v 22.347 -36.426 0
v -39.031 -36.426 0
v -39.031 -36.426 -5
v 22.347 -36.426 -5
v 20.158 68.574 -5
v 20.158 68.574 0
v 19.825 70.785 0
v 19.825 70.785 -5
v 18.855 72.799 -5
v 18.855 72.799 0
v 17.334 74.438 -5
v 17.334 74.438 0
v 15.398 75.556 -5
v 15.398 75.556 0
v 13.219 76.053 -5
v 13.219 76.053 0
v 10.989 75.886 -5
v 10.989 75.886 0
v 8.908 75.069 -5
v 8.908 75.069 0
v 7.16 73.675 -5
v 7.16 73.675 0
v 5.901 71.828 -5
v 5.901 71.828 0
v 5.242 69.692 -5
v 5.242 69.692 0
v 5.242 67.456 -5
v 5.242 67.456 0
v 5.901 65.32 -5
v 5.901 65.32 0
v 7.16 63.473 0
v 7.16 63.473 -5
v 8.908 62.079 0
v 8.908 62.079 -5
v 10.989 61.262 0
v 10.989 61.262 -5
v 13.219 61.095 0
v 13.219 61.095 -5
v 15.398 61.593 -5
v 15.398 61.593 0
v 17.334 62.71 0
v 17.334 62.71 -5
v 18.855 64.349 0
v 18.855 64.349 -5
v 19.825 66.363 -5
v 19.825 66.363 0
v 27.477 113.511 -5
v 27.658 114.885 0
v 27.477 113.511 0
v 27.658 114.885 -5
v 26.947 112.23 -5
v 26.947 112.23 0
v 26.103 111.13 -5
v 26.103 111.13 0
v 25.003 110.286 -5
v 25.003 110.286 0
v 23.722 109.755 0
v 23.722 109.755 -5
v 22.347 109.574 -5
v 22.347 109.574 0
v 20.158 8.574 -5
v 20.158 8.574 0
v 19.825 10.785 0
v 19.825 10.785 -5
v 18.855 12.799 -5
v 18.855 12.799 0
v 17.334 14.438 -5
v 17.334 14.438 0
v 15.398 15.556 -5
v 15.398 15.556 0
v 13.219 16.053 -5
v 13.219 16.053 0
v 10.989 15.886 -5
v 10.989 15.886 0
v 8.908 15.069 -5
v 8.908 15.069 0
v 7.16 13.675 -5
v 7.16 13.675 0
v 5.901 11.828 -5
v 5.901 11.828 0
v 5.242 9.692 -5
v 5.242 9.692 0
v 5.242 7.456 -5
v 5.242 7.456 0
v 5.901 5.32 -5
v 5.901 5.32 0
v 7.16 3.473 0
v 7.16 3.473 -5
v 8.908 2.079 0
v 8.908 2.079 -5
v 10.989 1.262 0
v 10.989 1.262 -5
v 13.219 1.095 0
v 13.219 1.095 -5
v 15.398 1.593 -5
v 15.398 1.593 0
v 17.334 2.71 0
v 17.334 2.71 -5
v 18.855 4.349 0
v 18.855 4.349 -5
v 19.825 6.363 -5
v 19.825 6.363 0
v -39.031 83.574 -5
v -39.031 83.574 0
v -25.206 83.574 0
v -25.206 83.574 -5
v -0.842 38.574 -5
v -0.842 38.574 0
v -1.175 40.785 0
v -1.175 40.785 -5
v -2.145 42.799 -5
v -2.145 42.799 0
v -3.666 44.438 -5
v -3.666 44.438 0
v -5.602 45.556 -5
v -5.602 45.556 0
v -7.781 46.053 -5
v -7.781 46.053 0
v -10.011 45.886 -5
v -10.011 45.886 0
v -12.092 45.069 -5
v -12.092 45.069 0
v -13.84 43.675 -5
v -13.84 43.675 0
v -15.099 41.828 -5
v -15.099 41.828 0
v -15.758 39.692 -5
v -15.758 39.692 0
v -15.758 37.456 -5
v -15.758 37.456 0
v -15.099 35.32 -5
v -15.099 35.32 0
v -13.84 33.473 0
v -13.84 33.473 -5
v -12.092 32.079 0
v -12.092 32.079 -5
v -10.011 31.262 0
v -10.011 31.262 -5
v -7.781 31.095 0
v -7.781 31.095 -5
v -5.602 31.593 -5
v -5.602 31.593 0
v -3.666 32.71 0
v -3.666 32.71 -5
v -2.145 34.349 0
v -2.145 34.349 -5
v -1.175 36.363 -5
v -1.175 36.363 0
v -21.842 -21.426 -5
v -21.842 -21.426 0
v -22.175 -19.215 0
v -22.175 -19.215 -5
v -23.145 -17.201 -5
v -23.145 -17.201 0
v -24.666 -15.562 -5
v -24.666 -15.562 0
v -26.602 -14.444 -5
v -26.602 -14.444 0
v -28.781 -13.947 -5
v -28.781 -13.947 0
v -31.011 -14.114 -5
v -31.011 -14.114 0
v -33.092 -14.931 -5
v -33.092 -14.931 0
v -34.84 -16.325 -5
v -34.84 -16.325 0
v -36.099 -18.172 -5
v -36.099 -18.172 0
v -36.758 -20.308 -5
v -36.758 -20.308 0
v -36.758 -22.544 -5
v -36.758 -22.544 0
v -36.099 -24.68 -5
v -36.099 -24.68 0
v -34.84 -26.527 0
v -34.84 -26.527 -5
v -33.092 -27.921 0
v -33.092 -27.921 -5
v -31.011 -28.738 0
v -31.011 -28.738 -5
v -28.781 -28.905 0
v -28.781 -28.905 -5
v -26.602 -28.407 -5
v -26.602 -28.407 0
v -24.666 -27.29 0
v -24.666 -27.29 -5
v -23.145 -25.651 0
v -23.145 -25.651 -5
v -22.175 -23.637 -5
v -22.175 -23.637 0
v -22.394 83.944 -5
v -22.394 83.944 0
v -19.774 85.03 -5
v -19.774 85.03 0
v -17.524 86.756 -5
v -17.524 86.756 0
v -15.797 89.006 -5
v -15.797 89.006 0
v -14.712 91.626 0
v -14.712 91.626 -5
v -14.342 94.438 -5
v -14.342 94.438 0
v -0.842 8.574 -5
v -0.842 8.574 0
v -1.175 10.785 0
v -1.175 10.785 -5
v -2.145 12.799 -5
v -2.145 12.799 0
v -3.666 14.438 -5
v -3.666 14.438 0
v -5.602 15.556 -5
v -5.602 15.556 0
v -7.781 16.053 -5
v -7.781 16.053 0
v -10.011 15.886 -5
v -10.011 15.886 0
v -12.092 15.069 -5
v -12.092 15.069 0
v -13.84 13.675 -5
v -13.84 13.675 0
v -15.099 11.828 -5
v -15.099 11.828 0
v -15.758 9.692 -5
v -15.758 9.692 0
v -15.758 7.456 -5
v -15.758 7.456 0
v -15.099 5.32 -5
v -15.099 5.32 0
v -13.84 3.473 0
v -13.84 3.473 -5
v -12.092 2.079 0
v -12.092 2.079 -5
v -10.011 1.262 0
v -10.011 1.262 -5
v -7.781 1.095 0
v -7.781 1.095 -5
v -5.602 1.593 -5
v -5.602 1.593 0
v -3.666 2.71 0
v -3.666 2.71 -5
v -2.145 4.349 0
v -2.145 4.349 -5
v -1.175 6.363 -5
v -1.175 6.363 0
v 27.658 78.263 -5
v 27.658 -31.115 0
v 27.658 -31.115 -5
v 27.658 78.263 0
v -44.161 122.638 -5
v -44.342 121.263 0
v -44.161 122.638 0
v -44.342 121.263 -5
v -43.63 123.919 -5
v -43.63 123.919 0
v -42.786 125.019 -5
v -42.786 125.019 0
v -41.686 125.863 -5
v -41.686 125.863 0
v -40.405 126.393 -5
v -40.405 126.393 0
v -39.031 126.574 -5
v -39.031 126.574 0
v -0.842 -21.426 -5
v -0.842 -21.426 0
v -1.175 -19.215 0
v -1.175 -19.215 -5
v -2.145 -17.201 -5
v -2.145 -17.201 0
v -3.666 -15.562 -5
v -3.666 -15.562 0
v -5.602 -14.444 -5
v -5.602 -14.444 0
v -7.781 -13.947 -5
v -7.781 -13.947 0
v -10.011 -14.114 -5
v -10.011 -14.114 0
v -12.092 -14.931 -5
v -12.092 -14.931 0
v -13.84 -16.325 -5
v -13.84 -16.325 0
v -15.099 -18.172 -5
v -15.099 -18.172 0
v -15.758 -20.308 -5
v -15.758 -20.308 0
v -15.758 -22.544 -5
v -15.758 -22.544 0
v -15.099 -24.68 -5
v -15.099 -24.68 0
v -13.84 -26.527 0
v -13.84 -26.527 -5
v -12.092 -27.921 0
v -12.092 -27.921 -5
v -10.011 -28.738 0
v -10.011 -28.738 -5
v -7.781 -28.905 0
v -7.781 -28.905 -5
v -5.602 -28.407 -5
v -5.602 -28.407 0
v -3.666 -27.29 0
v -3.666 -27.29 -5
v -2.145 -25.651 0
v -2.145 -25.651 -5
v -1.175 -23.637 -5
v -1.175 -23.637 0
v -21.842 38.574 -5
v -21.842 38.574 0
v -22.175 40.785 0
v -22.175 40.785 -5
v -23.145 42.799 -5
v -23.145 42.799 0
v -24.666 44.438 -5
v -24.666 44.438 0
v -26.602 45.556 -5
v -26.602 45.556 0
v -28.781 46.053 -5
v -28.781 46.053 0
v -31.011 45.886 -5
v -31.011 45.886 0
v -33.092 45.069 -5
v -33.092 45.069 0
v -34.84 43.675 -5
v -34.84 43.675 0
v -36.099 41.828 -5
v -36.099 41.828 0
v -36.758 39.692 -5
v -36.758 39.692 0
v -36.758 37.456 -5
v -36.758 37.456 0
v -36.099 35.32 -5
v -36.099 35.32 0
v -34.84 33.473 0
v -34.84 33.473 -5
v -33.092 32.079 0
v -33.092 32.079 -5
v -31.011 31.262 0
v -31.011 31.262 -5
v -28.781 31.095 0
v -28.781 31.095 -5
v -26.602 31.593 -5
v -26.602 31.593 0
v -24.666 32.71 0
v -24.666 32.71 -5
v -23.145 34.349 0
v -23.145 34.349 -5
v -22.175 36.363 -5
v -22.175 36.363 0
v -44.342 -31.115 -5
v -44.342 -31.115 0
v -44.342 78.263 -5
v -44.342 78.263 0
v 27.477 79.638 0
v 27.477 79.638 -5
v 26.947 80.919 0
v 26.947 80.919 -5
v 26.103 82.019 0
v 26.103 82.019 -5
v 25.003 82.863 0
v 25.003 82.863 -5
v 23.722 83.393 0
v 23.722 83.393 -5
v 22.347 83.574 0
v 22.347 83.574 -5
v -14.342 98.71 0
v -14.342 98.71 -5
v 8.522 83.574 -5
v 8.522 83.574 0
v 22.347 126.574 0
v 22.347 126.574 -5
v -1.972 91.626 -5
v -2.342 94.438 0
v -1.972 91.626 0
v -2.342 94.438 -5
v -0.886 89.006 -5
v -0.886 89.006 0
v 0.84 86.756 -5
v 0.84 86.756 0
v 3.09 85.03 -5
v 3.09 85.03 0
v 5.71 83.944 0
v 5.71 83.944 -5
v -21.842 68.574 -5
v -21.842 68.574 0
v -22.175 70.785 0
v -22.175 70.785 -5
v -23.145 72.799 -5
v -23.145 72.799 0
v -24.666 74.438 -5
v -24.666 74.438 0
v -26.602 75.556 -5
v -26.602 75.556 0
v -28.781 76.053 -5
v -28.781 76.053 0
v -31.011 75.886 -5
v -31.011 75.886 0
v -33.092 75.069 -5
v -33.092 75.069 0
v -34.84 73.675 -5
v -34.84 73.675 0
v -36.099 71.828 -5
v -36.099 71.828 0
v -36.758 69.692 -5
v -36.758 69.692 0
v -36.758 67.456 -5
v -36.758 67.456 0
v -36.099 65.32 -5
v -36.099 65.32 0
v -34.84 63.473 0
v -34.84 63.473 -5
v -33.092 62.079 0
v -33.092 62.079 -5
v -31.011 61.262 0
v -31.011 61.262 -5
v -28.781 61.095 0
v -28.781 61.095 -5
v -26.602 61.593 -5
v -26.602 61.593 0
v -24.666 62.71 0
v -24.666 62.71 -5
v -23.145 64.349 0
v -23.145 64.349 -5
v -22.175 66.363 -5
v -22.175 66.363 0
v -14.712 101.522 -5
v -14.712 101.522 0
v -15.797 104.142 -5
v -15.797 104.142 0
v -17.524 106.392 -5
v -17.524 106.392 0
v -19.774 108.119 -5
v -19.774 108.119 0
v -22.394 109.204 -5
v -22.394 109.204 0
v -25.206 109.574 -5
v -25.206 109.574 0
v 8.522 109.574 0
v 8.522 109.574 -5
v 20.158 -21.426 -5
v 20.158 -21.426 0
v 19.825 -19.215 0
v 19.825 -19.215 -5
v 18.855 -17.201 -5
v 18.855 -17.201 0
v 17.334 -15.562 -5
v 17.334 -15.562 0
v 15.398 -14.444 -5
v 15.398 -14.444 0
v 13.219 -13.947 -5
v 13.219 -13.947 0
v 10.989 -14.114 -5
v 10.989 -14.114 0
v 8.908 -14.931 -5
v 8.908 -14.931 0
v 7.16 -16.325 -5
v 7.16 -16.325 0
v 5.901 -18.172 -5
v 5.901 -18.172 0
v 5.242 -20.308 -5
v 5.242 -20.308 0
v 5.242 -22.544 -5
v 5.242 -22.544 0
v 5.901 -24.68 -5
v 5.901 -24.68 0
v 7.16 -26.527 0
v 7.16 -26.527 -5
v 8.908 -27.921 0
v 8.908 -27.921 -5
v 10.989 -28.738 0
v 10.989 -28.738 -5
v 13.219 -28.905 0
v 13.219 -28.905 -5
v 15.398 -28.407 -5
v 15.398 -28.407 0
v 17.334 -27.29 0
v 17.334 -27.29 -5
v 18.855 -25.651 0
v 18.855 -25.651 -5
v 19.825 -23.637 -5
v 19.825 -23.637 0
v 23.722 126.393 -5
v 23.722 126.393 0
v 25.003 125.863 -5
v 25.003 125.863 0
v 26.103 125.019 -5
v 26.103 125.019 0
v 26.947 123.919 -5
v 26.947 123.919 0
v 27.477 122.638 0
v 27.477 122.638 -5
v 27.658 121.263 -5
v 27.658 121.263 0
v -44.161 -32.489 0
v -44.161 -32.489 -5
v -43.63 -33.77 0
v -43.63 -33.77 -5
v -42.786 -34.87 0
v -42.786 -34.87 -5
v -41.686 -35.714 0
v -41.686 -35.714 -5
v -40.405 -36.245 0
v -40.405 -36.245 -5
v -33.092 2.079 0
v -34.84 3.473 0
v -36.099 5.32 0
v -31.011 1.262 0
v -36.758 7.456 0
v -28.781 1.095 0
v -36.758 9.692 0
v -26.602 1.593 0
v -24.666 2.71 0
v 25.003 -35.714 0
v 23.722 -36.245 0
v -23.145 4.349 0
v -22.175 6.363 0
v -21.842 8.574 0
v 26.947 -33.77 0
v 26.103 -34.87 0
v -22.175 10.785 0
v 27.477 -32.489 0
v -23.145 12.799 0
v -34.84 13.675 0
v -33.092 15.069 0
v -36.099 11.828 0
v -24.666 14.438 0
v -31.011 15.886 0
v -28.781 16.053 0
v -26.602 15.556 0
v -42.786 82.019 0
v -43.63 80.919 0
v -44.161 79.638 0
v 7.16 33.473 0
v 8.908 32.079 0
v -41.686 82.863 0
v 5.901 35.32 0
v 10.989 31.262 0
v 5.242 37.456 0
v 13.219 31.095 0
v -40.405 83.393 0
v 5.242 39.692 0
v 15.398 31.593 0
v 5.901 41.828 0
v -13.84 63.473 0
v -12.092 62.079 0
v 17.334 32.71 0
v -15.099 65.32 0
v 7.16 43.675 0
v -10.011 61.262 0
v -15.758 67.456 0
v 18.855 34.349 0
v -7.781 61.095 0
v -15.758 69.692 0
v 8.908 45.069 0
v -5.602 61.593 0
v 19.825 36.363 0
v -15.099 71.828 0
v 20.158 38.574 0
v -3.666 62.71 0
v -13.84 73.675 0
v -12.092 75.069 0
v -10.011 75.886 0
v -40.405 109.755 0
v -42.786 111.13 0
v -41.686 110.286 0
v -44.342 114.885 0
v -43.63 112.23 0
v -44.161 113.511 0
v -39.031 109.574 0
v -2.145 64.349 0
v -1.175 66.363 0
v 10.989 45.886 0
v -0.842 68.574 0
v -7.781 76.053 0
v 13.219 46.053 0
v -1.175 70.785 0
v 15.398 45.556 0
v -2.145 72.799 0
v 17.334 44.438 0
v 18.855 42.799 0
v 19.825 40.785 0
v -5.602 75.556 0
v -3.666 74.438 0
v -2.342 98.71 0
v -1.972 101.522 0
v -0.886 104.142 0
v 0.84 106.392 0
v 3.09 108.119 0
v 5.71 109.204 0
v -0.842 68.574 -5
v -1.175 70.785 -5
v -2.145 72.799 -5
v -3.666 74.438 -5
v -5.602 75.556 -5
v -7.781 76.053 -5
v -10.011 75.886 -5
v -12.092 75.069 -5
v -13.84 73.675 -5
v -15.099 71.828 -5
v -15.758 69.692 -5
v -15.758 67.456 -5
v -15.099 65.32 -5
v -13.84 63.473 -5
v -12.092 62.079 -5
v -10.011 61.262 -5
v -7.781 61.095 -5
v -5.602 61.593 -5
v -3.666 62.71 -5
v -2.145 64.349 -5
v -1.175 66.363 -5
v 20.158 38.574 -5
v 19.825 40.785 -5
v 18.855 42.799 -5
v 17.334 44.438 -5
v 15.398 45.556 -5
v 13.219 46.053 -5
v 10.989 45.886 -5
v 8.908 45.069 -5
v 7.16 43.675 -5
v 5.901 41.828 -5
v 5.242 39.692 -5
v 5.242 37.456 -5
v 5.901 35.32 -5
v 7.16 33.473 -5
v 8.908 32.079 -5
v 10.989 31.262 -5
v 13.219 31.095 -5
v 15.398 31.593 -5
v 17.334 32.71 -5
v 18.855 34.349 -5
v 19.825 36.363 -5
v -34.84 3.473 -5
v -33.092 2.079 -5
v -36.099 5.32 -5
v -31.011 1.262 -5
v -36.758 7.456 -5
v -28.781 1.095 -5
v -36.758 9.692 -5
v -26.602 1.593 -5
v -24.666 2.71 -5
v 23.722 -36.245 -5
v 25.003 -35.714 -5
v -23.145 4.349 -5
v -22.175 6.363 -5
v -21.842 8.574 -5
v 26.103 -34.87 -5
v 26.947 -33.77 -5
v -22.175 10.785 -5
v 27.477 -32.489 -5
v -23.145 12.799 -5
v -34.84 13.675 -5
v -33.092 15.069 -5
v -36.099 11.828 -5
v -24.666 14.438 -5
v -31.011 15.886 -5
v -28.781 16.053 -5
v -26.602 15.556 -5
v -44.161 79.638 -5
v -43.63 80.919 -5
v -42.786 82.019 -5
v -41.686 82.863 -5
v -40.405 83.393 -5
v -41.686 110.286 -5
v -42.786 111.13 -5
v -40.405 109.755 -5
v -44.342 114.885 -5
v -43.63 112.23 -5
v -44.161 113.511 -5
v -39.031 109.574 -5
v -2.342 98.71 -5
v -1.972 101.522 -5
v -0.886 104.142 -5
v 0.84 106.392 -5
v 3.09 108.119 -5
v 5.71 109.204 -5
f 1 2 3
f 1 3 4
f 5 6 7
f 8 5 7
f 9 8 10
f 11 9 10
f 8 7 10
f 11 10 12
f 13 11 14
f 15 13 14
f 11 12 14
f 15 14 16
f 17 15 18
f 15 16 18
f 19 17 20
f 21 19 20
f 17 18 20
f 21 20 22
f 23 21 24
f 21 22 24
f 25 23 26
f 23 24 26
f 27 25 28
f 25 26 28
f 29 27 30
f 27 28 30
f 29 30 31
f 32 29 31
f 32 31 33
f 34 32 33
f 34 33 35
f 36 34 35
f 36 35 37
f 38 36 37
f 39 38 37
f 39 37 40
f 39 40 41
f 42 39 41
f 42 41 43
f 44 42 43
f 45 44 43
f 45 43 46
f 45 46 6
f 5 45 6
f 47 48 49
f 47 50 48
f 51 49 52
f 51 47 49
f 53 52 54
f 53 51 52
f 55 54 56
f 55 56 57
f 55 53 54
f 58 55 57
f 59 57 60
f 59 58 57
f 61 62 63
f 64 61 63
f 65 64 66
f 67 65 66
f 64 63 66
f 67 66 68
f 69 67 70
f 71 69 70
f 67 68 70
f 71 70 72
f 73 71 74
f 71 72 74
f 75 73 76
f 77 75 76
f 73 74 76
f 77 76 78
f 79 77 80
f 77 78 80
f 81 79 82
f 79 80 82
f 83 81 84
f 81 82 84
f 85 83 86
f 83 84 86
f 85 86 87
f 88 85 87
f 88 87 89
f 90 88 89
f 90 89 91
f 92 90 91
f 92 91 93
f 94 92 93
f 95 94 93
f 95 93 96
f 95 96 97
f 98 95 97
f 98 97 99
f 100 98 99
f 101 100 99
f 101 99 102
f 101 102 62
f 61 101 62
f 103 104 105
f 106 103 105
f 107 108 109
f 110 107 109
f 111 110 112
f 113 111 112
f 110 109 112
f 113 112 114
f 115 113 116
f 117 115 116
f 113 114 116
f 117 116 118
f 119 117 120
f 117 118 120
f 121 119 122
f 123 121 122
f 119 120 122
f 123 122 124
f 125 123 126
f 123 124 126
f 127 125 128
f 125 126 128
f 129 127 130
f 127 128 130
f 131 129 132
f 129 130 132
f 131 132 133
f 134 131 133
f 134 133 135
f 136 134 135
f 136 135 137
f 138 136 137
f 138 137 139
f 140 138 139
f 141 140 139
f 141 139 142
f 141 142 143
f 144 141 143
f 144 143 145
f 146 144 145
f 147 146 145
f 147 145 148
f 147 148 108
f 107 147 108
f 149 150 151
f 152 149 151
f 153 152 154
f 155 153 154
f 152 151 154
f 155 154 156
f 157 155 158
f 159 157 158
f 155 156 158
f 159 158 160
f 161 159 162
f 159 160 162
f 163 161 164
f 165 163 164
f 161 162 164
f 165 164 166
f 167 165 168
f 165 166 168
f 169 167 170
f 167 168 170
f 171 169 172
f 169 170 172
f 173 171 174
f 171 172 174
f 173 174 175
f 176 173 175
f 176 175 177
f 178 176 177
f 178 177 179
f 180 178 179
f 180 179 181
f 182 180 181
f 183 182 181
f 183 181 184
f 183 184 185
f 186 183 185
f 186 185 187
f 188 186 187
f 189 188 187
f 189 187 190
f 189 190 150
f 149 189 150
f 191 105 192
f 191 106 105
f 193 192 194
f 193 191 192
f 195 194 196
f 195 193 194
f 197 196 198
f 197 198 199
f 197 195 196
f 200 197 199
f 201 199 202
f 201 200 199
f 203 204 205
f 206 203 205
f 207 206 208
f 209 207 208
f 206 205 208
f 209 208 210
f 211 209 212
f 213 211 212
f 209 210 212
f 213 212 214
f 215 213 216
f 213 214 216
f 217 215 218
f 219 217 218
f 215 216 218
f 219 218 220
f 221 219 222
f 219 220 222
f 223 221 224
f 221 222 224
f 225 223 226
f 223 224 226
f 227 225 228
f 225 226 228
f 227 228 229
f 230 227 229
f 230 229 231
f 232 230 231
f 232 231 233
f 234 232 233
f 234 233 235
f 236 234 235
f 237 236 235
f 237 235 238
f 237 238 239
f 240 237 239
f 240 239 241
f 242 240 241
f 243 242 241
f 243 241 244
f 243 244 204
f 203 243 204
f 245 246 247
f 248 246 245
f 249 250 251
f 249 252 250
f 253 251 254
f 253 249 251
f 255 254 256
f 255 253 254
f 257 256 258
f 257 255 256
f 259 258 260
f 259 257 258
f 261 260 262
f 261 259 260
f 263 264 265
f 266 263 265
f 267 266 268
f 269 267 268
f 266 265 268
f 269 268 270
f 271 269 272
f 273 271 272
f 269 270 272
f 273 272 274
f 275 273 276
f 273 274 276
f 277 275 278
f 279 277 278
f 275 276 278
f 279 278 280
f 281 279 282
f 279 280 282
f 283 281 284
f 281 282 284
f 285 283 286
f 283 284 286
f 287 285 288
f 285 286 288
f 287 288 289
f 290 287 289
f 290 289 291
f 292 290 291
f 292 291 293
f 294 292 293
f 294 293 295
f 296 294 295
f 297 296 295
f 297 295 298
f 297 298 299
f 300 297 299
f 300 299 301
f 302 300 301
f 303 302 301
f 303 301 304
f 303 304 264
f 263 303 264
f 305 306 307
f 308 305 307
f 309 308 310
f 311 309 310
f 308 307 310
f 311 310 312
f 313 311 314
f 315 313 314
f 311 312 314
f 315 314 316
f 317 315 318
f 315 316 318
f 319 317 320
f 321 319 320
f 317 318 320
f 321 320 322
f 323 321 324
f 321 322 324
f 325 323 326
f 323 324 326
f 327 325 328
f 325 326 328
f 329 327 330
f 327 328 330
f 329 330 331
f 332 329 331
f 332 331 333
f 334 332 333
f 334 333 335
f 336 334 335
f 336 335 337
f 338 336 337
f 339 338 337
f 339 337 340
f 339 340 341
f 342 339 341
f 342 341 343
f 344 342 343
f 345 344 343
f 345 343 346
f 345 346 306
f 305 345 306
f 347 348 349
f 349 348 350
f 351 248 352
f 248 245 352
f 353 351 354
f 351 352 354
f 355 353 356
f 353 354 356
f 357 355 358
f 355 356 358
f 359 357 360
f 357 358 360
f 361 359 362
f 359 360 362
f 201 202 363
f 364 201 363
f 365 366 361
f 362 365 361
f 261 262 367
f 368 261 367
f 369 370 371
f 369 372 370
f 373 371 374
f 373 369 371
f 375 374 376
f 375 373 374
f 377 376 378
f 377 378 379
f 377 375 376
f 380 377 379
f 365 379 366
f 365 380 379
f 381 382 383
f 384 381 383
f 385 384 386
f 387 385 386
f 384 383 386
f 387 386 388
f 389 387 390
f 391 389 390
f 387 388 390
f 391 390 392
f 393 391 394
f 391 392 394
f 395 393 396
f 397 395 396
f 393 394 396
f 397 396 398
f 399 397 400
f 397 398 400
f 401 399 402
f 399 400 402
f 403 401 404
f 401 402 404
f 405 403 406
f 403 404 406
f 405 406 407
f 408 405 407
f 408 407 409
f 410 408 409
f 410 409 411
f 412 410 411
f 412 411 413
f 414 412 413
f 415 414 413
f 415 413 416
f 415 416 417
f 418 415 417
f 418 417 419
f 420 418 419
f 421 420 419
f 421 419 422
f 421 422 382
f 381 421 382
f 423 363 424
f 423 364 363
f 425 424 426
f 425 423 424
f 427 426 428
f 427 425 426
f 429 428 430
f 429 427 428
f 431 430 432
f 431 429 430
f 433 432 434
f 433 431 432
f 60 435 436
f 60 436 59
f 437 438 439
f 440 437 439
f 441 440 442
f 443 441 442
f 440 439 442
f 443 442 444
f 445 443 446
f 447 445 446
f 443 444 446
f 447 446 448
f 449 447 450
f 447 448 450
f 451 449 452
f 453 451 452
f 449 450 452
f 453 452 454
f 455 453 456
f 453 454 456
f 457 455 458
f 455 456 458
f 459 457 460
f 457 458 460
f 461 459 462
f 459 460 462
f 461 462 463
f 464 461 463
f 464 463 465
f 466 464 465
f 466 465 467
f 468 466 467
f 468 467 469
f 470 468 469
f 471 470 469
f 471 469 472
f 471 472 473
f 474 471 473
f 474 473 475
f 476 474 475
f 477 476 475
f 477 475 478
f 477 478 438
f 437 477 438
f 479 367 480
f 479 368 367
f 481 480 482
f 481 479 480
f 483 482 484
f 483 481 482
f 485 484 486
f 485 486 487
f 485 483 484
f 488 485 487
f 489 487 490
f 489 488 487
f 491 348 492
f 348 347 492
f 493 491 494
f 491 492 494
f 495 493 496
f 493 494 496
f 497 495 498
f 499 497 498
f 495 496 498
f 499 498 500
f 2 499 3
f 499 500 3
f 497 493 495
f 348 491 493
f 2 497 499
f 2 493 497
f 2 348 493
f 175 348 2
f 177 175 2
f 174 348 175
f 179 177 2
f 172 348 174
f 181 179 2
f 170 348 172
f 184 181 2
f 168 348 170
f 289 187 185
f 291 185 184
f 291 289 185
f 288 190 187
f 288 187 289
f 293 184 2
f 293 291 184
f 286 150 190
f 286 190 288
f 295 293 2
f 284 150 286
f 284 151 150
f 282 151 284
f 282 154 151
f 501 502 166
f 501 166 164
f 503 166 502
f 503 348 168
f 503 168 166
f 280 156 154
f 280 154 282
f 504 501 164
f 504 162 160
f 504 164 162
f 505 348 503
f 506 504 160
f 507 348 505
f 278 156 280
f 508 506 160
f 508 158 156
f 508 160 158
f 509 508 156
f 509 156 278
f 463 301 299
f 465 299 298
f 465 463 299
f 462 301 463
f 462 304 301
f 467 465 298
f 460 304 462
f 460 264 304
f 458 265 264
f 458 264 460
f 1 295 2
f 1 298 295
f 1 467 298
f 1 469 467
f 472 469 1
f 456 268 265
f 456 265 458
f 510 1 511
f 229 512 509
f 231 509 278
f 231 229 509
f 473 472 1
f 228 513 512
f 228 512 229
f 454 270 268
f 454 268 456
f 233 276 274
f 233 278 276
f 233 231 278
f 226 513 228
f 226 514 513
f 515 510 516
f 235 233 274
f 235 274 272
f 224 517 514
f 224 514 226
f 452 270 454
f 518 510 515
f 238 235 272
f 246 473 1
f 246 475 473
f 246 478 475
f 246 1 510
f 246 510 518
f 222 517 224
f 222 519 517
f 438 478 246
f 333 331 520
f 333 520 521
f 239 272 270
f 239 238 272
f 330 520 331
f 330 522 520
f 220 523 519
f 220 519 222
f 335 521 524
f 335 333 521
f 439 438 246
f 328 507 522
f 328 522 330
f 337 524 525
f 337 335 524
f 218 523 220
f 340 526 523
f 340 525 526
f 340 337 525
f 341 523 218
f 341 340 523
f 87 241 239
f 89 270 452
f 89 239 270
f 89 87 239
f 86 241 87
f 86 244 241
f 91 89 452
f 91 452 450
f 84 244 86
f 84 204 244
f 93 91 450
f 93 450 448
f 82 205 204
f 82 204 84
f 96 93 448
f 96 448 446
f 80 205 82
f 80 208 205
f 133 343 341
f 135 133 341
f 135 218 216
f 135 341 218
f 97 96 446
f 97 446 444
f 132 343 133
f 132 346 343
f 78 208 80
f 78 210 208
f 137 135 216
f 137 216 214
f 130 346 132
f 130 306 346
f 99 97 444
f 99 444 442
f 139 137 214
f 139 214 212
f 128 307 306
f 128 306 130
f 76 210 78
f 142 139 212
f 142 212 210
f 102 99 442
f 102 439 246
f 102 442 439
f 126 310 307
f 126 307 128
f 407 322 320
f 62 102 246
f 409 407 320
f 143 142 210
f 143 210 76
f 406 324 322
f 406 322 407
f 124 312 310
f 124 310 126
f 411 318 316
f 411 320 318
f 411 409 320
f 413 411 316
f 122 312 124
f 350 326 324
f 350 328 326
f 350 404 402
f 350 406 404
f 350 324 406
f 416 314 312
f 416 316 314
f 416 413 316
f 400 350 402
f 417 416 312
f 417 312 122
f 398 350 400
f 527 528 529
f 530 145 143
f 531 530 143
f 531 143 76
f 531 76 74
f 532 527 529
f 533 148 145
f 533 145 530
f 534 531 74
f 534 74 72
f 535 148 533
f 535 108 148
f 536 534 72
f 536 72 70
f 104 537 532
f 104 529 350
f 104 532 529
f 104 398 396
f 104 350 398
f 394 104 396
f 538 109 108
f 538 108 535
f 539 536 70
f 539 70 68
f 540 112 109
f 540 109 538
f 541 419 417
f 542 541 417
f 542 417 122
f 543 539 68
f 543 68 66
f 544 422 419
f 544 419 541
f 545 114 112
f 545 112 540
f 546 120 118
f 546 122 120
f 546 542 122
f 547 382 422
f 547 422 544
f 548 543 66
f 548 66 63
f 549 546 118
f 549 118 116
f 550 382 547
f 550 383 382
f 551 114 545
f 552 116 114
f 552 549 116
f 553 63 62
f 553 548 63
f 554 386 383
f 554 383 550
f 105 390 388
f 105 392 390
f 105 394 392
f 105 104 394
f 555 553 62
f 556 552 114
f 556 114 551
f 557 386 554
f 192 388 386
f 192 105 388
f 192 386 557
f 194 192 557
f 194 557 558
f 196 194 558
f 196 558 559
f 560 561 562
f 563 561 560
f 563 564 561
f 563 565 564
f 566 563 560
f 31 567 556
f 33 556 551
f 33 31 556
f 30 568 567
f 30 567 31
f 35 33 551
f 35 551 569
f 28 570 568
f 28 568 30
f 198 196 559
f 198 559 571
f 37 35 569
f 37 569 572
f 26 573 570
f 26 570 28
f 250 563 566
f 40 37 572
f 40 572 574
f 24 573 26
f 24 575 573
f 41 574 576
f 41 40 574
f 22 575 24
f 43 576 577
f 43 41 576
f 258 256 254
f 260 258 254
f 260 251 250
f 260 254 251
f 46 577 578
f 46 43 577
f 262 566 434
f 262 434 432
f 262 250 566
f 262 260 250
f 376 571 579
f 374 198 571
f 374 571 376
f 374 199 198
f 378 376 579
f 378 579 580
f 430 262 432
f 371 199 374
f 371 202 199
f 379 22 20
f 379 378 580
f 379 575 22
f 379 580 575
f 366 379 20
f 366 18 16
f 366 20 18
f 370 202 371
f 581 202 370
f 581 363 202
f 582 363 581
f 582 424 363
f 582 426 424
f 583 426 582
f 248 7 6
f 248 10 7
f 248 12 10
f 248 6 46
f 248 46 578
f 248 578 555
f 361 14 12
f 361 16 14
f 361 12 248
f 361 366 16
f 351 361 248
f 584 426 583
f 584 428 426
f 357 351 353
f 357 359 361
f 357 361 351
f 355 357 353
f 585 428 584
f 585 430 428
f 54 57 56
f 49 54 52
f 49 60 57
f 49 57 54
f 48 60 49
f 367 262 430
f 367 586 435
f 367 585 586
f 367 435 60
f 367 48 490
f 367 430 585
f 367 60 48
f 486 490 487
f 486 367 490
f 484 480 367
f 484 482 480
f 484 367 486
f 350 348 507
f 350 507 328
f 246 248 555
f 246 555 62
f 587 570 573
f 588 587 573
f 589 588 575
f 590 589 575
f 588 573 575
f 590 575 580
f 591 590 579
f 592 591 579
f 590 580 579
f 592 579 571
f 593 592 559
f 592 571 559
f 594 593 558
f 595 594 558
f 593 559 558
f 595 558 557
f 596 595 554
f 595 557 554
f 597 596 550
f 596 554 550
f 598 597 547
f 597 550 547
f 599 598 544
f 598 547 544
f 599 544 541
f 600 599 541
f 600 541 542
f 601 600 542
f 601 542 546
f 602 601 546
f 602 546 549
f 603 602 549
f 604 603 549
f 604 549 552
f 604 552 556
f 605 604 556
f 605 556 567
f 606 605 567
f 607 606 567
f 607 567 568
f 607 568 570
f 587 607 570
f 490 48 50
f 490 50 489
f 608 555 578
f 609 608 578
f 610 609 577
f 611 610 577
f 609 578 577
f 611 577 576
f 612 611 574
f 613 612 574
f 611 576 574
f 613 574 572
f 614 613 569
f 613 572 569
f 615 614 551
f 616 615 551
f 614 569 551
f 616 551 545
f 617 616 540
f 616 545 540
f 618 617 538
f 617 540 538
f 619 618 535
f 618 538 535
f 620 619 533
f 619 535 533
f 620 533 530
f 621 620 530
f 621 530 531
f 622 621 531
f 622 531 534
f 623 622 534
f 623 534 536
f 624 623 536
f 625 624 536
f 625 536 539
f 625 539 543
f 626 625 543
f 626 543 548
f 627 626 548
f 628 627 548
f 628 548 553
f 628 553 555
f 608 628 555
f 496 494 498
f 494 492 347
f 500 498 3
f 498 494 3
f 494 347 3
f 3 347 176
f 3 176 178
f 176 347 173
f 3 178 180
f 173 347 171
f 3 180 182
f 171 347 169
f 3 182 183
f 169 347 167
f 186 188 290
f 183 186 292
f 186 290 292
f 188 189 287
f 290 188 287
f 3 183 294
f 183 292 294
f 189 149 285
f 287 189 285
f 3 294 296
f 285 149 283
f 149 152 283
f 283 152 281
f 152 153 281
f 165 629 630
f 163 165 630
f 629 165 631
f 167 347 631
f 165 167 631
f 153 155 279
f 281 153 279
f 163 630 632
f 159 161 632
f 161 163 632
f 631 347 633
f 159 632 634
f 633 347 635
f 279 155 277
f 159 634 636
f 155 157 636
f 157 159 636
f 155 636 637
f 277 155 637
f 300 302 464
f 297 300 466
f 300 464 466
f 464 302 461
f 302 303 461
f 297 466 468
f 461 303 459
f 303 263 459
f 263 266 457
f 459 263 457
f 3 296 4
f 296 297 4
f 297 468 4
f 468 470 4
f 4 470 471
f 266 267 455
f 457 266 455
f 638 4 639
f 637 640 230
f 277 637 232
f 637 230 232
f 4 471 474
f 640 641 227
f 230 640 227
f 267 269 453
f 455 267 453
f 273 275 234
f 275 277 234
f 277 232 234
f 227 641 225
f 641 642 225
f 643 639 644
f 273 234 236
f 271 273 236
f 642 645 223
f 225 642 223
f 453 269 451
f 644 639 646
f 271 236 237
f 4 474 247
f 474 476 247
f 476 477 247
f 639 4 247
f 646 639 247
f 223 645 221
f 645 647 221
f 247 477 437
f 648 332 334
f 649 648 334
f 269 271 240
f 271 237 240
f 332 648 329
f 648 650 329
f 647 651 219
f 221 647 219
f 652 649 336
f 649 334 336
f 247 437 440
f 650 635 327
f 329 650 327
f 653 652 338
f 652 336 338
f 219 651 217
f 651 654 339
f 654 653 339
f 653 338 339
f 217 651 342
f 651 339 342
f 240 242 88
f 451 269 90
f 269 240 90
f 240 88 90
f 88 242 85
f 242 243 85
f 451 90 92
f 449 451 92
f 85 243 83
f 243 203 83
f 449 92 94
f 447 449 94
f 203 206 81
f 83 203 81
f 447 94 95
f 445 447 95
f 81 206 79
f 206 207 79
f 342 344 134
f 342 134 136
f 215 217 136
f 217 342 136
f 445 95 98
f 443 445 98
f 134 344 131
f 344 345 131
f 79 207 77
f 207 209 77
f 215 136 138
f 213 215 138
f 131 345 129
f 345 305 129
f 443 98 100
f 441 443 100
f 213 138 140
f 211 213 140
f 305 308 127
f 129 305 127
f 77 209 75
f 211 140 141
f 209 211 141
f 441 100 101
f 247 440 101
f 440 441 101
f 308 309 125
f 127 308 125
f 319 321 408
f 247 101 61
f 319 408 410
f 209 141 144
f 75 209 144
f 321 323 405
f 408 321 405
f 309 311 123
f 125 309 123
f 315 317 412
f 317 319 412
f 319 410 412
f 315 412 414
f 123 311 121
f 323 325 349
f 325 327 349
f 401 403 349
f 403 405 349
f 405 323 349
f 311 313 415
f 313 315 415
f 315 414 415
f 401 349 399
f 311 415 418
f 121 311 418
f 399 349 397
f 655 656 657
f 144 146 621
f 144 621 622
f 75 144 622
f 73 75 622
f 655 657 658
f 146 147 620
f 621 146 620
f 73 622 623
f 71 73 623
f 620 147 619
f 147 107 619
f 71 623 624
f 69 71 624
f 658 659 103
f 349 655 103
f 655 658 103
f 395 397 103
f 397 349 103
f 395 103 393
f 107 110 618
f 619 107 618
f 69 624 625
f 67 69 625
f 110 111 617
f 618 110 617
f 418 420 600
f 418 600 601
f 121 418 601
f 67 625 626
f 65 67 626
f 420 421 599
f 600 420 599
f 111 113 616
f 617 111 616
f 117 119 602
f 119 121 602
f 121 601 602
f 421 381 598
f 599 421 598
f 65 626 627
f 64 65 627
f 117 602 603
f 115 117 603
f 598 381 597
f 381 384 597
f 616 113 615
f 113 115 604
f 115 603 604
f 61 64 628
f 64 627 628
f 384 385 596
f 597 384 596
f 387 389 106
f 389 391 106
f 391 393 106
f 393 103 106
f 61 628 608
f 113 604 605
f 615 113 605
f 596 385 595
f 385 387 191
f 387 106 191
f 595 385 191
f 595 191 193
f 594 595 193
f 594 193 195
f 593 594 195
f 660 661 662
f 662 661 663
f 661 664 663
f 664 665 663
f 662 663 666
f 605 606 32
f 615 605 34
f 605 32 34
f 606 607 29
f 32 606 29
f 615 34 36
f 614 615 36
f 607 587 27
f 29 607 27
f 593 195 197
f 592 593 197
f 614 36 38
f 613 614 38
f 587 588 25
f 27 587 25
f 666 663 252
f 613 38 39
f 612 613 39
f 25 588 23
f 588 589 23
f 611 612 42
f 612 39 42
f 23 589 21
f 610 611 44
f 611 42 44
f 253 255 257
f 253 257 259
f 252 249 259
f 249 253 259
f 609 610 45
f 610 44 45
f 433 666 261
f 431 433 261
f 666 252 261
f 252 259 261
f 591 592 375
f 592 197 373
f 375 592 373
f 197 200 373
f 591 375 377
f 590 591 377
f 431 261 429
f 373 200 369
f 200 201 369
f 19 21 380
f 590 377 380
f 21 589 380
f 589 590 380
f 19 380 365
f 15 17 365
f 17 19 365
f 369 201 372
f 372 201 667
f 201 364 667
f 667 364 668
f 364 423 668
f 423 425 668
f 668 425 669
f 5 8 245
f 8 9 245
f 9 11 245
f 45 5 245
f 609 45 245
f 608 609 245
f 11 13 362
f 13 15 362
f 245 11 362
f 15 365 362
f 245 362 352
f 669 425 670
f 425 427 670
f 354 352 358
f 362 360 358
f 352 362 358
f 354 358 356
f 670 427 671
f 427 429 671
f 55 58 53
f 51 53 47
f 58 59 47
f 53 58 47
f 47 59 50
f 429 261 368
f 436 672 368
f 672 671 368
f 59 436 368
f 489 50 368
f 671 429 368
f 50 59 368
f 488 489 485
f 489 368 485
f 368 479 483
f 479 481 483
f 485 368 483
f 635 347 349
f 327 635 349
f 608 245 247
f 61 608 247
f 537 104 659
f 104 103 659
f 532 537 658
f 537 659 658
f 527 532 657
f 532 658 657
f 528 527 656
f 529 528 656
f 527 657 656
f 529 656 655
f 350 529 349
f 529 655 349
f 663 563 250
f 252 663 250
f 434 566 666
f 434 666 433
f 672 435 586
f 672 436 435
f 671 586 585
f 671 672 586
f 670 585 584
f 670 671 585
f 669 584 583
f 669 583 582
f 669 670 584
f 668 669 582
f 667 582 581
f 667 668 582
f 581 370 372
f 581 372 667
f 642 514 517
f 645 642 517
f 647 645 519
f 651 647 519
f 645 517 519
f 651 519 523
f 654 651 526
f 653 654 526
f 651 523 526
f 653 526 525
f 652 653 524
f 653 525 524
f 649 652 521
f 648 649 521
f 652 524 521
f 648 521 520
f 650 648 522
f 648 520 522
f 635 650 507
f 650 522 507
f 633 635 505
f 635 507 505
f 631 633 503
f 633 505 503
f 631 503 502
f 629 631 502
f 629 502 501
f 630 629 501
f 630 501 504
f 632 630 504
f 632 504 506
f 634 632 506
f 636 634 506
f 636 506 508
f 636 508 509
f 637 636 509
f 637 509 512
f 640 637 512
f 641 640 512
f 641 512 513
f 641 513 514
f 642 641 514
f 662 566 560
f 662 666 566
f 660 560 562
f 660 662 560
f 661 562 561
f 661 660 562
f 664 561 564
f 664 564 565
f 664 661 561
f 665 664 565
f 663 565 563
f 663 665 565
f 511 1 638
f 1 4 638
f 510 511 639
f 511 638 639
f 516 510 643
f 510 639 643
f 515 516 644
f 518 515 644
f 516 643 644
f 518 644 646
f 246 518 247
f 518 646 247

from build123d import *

# Parameters (mm, degrees)
F0_W     = 72
F0_H     = 163
F1_DEPTH = 5
F2_W     = 30
F2_H     = 26
F2_R     = 7.5
F3_DEPTH = 25
F4_R     = 10.8639610307
F5_R     = 5.3112698372


with BuildPart() as f1:
    # F0 (on Top) → F1 (new body)
    with BuildSketch(Plane.XY):
        with Locations((-8.3418504, 45.0741375387)):
            Rectangle(F0_W, F0_H)
    extrude(amount=-F1_DEPTH)

    # F2 (on face) → F3 (cut)
    with BuildSketch(Plane.XY):
        with Locations((12.6581496, 96.5741375387)):
            Rectangle(F2_W, F2_H)
        with Locations((-29.3418504, 96.5741375387)):
            Rectangle(F2_W, F2_H)
        with Locations((12.6581496, 68.5741375387)):
            Circle(F2_R)
        with Locations((-29.3418504, 68.5741375387)):
            Circle(F2_R)
        with Locations((-8.3418504, 38.5741375387)):
            Circle(F2_R)
        with Locations((-29.3418504, -21.4258624613)):
            Circle(F2_R)
        with Locations((12.6581496, -21.4258624613)):
            Circle(F2_R)
        with Locations((12.6581496, 38.5741375387)):
            Circle(F2_R)
        with Locations((-8.3418504, 68.5741375387)):
            Circle(F2_R)
        with Locations((-29.3418504, 38.5741375387)):
            Circle(F2_R)
        with Locations((-8.3418507129, -21.4258624613)):
            Circle(F2_R)
        with Locations((-29.3418504, 8.5741375387)):
            Circle(F2_R)
        with Locations((12.6581492871, 8.5741375387)):
            Circle(F2_R)
        with Locations((-8.3418507129, 8.5741375387)):
            Circle(F2_R)
    extrude(amount=-F3_DEPTH, mode=Mode.SUBTRACT)

    # F4
    f4_edges = [f1.edges().sort_by_distance(p)[0] for p in [
        (-2.34185, 109.574138, -2.5),
        (-2.34185, 83.574138, -2.5),
        (-14.34185, 83.574138, -2.5),
        (-14.34185, 109.574138, -2.5),
    ]]
    fillet(f4_edges, radius=F4_R)

    # F5
    f5_edges = [f1.edges().sort_by_distance(p)[0] for p in [
        (27.65815, 126.574138, -2.5),
        (-44.34185, 126.574138, -2.5),
        (-44.34185, 109.574138, -2.5),
        (-44.34185, 83.574138, -2.5),
        (27.65815, 109.574138, -2.5),
        (27.65815, 83.574138, -2.5),
        (-44.34185, -36.425862, -2.5),
        (27.65815, -36.425862, -2.5),
    ]]
    fillet(f5_edges, radius=F5_R)


solid = f1.part
